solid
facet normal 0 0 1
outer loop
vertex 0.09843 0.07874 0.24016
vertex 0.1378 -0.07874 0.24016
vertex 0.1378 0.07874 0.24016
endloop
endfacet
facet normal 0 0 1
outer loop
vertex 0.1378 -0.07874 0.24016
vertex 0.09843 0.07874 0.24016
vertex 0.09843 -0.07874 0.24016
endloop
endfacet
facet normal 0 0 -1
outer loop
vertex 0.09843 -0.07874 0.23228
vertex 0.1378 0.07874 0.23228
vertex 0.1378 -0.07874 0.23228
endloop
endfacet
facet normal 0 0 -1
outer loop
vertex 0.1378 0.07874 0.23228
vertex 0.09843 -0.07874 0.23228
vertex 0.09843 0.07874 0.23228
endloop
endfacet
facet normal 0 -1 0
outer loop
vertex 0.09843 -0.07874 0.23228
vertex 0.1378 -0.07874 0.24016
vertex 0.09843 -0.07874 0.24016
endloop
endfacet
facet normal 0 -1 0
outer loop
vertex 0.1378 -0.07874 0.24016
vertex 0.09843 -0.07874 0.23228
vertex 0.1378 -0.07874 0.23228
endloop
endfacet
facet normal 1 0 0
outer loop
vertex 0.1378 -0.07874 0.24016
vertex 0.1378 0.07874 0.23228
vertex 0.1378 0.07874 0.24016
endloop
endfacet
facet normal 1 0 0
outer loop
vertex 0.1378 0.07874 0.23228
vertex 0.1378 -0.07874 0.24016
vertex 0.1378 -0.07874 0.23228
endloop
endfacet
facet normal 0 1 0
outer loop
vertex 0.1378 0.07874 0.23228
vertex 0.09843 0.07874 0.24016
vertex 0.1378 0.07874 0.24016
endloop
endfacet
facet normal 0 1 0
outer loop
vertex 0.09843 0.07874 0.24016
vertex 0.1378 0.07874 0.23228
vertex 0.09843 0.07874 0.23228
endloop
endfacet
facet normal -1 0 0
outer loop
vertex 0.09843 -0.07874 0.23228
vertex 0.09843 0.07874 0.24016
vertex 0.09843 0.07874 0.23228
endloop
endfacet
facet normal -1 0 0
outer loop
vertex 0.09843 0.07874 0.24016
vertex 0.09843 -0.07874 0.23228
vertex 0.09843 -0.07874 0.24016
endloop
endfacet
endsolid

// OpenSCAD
// file: defines.scad
L = 3.0;  // Длина
W = 3.0;  // Ширина
H = 1.0;  // Высота
Hf = 0.04;  // Возвышение над платой (высота выводов)
e = 0.5;    // Шаг выводов

pin_fragments = 16;

A = 0.60;
E = 1.60;
E1 = 1.20;
D = 0.80;
b = 0.28; // 0.25 .. 0.35
c = 0.10; // 0.07 .. 0.20
L = 0.20;
L1 = 0.1; // 0.05 .. 0.20


scale = 1/2.54;
// main file
include <defines.scad>

/*font = "Liberation Sans";*/
/*font = "DejaVu";*/
/*font = "Abyssinica SIL";*/

/*$fn = 64;*/

// Label
scale(scale) color("White")  {

    translate([0.3, 0, A]) {
        /*cylinder(r = 0.12, h = 0.02);*/
        cube([0.1,0.4,0.02], center = true);
    }

}
